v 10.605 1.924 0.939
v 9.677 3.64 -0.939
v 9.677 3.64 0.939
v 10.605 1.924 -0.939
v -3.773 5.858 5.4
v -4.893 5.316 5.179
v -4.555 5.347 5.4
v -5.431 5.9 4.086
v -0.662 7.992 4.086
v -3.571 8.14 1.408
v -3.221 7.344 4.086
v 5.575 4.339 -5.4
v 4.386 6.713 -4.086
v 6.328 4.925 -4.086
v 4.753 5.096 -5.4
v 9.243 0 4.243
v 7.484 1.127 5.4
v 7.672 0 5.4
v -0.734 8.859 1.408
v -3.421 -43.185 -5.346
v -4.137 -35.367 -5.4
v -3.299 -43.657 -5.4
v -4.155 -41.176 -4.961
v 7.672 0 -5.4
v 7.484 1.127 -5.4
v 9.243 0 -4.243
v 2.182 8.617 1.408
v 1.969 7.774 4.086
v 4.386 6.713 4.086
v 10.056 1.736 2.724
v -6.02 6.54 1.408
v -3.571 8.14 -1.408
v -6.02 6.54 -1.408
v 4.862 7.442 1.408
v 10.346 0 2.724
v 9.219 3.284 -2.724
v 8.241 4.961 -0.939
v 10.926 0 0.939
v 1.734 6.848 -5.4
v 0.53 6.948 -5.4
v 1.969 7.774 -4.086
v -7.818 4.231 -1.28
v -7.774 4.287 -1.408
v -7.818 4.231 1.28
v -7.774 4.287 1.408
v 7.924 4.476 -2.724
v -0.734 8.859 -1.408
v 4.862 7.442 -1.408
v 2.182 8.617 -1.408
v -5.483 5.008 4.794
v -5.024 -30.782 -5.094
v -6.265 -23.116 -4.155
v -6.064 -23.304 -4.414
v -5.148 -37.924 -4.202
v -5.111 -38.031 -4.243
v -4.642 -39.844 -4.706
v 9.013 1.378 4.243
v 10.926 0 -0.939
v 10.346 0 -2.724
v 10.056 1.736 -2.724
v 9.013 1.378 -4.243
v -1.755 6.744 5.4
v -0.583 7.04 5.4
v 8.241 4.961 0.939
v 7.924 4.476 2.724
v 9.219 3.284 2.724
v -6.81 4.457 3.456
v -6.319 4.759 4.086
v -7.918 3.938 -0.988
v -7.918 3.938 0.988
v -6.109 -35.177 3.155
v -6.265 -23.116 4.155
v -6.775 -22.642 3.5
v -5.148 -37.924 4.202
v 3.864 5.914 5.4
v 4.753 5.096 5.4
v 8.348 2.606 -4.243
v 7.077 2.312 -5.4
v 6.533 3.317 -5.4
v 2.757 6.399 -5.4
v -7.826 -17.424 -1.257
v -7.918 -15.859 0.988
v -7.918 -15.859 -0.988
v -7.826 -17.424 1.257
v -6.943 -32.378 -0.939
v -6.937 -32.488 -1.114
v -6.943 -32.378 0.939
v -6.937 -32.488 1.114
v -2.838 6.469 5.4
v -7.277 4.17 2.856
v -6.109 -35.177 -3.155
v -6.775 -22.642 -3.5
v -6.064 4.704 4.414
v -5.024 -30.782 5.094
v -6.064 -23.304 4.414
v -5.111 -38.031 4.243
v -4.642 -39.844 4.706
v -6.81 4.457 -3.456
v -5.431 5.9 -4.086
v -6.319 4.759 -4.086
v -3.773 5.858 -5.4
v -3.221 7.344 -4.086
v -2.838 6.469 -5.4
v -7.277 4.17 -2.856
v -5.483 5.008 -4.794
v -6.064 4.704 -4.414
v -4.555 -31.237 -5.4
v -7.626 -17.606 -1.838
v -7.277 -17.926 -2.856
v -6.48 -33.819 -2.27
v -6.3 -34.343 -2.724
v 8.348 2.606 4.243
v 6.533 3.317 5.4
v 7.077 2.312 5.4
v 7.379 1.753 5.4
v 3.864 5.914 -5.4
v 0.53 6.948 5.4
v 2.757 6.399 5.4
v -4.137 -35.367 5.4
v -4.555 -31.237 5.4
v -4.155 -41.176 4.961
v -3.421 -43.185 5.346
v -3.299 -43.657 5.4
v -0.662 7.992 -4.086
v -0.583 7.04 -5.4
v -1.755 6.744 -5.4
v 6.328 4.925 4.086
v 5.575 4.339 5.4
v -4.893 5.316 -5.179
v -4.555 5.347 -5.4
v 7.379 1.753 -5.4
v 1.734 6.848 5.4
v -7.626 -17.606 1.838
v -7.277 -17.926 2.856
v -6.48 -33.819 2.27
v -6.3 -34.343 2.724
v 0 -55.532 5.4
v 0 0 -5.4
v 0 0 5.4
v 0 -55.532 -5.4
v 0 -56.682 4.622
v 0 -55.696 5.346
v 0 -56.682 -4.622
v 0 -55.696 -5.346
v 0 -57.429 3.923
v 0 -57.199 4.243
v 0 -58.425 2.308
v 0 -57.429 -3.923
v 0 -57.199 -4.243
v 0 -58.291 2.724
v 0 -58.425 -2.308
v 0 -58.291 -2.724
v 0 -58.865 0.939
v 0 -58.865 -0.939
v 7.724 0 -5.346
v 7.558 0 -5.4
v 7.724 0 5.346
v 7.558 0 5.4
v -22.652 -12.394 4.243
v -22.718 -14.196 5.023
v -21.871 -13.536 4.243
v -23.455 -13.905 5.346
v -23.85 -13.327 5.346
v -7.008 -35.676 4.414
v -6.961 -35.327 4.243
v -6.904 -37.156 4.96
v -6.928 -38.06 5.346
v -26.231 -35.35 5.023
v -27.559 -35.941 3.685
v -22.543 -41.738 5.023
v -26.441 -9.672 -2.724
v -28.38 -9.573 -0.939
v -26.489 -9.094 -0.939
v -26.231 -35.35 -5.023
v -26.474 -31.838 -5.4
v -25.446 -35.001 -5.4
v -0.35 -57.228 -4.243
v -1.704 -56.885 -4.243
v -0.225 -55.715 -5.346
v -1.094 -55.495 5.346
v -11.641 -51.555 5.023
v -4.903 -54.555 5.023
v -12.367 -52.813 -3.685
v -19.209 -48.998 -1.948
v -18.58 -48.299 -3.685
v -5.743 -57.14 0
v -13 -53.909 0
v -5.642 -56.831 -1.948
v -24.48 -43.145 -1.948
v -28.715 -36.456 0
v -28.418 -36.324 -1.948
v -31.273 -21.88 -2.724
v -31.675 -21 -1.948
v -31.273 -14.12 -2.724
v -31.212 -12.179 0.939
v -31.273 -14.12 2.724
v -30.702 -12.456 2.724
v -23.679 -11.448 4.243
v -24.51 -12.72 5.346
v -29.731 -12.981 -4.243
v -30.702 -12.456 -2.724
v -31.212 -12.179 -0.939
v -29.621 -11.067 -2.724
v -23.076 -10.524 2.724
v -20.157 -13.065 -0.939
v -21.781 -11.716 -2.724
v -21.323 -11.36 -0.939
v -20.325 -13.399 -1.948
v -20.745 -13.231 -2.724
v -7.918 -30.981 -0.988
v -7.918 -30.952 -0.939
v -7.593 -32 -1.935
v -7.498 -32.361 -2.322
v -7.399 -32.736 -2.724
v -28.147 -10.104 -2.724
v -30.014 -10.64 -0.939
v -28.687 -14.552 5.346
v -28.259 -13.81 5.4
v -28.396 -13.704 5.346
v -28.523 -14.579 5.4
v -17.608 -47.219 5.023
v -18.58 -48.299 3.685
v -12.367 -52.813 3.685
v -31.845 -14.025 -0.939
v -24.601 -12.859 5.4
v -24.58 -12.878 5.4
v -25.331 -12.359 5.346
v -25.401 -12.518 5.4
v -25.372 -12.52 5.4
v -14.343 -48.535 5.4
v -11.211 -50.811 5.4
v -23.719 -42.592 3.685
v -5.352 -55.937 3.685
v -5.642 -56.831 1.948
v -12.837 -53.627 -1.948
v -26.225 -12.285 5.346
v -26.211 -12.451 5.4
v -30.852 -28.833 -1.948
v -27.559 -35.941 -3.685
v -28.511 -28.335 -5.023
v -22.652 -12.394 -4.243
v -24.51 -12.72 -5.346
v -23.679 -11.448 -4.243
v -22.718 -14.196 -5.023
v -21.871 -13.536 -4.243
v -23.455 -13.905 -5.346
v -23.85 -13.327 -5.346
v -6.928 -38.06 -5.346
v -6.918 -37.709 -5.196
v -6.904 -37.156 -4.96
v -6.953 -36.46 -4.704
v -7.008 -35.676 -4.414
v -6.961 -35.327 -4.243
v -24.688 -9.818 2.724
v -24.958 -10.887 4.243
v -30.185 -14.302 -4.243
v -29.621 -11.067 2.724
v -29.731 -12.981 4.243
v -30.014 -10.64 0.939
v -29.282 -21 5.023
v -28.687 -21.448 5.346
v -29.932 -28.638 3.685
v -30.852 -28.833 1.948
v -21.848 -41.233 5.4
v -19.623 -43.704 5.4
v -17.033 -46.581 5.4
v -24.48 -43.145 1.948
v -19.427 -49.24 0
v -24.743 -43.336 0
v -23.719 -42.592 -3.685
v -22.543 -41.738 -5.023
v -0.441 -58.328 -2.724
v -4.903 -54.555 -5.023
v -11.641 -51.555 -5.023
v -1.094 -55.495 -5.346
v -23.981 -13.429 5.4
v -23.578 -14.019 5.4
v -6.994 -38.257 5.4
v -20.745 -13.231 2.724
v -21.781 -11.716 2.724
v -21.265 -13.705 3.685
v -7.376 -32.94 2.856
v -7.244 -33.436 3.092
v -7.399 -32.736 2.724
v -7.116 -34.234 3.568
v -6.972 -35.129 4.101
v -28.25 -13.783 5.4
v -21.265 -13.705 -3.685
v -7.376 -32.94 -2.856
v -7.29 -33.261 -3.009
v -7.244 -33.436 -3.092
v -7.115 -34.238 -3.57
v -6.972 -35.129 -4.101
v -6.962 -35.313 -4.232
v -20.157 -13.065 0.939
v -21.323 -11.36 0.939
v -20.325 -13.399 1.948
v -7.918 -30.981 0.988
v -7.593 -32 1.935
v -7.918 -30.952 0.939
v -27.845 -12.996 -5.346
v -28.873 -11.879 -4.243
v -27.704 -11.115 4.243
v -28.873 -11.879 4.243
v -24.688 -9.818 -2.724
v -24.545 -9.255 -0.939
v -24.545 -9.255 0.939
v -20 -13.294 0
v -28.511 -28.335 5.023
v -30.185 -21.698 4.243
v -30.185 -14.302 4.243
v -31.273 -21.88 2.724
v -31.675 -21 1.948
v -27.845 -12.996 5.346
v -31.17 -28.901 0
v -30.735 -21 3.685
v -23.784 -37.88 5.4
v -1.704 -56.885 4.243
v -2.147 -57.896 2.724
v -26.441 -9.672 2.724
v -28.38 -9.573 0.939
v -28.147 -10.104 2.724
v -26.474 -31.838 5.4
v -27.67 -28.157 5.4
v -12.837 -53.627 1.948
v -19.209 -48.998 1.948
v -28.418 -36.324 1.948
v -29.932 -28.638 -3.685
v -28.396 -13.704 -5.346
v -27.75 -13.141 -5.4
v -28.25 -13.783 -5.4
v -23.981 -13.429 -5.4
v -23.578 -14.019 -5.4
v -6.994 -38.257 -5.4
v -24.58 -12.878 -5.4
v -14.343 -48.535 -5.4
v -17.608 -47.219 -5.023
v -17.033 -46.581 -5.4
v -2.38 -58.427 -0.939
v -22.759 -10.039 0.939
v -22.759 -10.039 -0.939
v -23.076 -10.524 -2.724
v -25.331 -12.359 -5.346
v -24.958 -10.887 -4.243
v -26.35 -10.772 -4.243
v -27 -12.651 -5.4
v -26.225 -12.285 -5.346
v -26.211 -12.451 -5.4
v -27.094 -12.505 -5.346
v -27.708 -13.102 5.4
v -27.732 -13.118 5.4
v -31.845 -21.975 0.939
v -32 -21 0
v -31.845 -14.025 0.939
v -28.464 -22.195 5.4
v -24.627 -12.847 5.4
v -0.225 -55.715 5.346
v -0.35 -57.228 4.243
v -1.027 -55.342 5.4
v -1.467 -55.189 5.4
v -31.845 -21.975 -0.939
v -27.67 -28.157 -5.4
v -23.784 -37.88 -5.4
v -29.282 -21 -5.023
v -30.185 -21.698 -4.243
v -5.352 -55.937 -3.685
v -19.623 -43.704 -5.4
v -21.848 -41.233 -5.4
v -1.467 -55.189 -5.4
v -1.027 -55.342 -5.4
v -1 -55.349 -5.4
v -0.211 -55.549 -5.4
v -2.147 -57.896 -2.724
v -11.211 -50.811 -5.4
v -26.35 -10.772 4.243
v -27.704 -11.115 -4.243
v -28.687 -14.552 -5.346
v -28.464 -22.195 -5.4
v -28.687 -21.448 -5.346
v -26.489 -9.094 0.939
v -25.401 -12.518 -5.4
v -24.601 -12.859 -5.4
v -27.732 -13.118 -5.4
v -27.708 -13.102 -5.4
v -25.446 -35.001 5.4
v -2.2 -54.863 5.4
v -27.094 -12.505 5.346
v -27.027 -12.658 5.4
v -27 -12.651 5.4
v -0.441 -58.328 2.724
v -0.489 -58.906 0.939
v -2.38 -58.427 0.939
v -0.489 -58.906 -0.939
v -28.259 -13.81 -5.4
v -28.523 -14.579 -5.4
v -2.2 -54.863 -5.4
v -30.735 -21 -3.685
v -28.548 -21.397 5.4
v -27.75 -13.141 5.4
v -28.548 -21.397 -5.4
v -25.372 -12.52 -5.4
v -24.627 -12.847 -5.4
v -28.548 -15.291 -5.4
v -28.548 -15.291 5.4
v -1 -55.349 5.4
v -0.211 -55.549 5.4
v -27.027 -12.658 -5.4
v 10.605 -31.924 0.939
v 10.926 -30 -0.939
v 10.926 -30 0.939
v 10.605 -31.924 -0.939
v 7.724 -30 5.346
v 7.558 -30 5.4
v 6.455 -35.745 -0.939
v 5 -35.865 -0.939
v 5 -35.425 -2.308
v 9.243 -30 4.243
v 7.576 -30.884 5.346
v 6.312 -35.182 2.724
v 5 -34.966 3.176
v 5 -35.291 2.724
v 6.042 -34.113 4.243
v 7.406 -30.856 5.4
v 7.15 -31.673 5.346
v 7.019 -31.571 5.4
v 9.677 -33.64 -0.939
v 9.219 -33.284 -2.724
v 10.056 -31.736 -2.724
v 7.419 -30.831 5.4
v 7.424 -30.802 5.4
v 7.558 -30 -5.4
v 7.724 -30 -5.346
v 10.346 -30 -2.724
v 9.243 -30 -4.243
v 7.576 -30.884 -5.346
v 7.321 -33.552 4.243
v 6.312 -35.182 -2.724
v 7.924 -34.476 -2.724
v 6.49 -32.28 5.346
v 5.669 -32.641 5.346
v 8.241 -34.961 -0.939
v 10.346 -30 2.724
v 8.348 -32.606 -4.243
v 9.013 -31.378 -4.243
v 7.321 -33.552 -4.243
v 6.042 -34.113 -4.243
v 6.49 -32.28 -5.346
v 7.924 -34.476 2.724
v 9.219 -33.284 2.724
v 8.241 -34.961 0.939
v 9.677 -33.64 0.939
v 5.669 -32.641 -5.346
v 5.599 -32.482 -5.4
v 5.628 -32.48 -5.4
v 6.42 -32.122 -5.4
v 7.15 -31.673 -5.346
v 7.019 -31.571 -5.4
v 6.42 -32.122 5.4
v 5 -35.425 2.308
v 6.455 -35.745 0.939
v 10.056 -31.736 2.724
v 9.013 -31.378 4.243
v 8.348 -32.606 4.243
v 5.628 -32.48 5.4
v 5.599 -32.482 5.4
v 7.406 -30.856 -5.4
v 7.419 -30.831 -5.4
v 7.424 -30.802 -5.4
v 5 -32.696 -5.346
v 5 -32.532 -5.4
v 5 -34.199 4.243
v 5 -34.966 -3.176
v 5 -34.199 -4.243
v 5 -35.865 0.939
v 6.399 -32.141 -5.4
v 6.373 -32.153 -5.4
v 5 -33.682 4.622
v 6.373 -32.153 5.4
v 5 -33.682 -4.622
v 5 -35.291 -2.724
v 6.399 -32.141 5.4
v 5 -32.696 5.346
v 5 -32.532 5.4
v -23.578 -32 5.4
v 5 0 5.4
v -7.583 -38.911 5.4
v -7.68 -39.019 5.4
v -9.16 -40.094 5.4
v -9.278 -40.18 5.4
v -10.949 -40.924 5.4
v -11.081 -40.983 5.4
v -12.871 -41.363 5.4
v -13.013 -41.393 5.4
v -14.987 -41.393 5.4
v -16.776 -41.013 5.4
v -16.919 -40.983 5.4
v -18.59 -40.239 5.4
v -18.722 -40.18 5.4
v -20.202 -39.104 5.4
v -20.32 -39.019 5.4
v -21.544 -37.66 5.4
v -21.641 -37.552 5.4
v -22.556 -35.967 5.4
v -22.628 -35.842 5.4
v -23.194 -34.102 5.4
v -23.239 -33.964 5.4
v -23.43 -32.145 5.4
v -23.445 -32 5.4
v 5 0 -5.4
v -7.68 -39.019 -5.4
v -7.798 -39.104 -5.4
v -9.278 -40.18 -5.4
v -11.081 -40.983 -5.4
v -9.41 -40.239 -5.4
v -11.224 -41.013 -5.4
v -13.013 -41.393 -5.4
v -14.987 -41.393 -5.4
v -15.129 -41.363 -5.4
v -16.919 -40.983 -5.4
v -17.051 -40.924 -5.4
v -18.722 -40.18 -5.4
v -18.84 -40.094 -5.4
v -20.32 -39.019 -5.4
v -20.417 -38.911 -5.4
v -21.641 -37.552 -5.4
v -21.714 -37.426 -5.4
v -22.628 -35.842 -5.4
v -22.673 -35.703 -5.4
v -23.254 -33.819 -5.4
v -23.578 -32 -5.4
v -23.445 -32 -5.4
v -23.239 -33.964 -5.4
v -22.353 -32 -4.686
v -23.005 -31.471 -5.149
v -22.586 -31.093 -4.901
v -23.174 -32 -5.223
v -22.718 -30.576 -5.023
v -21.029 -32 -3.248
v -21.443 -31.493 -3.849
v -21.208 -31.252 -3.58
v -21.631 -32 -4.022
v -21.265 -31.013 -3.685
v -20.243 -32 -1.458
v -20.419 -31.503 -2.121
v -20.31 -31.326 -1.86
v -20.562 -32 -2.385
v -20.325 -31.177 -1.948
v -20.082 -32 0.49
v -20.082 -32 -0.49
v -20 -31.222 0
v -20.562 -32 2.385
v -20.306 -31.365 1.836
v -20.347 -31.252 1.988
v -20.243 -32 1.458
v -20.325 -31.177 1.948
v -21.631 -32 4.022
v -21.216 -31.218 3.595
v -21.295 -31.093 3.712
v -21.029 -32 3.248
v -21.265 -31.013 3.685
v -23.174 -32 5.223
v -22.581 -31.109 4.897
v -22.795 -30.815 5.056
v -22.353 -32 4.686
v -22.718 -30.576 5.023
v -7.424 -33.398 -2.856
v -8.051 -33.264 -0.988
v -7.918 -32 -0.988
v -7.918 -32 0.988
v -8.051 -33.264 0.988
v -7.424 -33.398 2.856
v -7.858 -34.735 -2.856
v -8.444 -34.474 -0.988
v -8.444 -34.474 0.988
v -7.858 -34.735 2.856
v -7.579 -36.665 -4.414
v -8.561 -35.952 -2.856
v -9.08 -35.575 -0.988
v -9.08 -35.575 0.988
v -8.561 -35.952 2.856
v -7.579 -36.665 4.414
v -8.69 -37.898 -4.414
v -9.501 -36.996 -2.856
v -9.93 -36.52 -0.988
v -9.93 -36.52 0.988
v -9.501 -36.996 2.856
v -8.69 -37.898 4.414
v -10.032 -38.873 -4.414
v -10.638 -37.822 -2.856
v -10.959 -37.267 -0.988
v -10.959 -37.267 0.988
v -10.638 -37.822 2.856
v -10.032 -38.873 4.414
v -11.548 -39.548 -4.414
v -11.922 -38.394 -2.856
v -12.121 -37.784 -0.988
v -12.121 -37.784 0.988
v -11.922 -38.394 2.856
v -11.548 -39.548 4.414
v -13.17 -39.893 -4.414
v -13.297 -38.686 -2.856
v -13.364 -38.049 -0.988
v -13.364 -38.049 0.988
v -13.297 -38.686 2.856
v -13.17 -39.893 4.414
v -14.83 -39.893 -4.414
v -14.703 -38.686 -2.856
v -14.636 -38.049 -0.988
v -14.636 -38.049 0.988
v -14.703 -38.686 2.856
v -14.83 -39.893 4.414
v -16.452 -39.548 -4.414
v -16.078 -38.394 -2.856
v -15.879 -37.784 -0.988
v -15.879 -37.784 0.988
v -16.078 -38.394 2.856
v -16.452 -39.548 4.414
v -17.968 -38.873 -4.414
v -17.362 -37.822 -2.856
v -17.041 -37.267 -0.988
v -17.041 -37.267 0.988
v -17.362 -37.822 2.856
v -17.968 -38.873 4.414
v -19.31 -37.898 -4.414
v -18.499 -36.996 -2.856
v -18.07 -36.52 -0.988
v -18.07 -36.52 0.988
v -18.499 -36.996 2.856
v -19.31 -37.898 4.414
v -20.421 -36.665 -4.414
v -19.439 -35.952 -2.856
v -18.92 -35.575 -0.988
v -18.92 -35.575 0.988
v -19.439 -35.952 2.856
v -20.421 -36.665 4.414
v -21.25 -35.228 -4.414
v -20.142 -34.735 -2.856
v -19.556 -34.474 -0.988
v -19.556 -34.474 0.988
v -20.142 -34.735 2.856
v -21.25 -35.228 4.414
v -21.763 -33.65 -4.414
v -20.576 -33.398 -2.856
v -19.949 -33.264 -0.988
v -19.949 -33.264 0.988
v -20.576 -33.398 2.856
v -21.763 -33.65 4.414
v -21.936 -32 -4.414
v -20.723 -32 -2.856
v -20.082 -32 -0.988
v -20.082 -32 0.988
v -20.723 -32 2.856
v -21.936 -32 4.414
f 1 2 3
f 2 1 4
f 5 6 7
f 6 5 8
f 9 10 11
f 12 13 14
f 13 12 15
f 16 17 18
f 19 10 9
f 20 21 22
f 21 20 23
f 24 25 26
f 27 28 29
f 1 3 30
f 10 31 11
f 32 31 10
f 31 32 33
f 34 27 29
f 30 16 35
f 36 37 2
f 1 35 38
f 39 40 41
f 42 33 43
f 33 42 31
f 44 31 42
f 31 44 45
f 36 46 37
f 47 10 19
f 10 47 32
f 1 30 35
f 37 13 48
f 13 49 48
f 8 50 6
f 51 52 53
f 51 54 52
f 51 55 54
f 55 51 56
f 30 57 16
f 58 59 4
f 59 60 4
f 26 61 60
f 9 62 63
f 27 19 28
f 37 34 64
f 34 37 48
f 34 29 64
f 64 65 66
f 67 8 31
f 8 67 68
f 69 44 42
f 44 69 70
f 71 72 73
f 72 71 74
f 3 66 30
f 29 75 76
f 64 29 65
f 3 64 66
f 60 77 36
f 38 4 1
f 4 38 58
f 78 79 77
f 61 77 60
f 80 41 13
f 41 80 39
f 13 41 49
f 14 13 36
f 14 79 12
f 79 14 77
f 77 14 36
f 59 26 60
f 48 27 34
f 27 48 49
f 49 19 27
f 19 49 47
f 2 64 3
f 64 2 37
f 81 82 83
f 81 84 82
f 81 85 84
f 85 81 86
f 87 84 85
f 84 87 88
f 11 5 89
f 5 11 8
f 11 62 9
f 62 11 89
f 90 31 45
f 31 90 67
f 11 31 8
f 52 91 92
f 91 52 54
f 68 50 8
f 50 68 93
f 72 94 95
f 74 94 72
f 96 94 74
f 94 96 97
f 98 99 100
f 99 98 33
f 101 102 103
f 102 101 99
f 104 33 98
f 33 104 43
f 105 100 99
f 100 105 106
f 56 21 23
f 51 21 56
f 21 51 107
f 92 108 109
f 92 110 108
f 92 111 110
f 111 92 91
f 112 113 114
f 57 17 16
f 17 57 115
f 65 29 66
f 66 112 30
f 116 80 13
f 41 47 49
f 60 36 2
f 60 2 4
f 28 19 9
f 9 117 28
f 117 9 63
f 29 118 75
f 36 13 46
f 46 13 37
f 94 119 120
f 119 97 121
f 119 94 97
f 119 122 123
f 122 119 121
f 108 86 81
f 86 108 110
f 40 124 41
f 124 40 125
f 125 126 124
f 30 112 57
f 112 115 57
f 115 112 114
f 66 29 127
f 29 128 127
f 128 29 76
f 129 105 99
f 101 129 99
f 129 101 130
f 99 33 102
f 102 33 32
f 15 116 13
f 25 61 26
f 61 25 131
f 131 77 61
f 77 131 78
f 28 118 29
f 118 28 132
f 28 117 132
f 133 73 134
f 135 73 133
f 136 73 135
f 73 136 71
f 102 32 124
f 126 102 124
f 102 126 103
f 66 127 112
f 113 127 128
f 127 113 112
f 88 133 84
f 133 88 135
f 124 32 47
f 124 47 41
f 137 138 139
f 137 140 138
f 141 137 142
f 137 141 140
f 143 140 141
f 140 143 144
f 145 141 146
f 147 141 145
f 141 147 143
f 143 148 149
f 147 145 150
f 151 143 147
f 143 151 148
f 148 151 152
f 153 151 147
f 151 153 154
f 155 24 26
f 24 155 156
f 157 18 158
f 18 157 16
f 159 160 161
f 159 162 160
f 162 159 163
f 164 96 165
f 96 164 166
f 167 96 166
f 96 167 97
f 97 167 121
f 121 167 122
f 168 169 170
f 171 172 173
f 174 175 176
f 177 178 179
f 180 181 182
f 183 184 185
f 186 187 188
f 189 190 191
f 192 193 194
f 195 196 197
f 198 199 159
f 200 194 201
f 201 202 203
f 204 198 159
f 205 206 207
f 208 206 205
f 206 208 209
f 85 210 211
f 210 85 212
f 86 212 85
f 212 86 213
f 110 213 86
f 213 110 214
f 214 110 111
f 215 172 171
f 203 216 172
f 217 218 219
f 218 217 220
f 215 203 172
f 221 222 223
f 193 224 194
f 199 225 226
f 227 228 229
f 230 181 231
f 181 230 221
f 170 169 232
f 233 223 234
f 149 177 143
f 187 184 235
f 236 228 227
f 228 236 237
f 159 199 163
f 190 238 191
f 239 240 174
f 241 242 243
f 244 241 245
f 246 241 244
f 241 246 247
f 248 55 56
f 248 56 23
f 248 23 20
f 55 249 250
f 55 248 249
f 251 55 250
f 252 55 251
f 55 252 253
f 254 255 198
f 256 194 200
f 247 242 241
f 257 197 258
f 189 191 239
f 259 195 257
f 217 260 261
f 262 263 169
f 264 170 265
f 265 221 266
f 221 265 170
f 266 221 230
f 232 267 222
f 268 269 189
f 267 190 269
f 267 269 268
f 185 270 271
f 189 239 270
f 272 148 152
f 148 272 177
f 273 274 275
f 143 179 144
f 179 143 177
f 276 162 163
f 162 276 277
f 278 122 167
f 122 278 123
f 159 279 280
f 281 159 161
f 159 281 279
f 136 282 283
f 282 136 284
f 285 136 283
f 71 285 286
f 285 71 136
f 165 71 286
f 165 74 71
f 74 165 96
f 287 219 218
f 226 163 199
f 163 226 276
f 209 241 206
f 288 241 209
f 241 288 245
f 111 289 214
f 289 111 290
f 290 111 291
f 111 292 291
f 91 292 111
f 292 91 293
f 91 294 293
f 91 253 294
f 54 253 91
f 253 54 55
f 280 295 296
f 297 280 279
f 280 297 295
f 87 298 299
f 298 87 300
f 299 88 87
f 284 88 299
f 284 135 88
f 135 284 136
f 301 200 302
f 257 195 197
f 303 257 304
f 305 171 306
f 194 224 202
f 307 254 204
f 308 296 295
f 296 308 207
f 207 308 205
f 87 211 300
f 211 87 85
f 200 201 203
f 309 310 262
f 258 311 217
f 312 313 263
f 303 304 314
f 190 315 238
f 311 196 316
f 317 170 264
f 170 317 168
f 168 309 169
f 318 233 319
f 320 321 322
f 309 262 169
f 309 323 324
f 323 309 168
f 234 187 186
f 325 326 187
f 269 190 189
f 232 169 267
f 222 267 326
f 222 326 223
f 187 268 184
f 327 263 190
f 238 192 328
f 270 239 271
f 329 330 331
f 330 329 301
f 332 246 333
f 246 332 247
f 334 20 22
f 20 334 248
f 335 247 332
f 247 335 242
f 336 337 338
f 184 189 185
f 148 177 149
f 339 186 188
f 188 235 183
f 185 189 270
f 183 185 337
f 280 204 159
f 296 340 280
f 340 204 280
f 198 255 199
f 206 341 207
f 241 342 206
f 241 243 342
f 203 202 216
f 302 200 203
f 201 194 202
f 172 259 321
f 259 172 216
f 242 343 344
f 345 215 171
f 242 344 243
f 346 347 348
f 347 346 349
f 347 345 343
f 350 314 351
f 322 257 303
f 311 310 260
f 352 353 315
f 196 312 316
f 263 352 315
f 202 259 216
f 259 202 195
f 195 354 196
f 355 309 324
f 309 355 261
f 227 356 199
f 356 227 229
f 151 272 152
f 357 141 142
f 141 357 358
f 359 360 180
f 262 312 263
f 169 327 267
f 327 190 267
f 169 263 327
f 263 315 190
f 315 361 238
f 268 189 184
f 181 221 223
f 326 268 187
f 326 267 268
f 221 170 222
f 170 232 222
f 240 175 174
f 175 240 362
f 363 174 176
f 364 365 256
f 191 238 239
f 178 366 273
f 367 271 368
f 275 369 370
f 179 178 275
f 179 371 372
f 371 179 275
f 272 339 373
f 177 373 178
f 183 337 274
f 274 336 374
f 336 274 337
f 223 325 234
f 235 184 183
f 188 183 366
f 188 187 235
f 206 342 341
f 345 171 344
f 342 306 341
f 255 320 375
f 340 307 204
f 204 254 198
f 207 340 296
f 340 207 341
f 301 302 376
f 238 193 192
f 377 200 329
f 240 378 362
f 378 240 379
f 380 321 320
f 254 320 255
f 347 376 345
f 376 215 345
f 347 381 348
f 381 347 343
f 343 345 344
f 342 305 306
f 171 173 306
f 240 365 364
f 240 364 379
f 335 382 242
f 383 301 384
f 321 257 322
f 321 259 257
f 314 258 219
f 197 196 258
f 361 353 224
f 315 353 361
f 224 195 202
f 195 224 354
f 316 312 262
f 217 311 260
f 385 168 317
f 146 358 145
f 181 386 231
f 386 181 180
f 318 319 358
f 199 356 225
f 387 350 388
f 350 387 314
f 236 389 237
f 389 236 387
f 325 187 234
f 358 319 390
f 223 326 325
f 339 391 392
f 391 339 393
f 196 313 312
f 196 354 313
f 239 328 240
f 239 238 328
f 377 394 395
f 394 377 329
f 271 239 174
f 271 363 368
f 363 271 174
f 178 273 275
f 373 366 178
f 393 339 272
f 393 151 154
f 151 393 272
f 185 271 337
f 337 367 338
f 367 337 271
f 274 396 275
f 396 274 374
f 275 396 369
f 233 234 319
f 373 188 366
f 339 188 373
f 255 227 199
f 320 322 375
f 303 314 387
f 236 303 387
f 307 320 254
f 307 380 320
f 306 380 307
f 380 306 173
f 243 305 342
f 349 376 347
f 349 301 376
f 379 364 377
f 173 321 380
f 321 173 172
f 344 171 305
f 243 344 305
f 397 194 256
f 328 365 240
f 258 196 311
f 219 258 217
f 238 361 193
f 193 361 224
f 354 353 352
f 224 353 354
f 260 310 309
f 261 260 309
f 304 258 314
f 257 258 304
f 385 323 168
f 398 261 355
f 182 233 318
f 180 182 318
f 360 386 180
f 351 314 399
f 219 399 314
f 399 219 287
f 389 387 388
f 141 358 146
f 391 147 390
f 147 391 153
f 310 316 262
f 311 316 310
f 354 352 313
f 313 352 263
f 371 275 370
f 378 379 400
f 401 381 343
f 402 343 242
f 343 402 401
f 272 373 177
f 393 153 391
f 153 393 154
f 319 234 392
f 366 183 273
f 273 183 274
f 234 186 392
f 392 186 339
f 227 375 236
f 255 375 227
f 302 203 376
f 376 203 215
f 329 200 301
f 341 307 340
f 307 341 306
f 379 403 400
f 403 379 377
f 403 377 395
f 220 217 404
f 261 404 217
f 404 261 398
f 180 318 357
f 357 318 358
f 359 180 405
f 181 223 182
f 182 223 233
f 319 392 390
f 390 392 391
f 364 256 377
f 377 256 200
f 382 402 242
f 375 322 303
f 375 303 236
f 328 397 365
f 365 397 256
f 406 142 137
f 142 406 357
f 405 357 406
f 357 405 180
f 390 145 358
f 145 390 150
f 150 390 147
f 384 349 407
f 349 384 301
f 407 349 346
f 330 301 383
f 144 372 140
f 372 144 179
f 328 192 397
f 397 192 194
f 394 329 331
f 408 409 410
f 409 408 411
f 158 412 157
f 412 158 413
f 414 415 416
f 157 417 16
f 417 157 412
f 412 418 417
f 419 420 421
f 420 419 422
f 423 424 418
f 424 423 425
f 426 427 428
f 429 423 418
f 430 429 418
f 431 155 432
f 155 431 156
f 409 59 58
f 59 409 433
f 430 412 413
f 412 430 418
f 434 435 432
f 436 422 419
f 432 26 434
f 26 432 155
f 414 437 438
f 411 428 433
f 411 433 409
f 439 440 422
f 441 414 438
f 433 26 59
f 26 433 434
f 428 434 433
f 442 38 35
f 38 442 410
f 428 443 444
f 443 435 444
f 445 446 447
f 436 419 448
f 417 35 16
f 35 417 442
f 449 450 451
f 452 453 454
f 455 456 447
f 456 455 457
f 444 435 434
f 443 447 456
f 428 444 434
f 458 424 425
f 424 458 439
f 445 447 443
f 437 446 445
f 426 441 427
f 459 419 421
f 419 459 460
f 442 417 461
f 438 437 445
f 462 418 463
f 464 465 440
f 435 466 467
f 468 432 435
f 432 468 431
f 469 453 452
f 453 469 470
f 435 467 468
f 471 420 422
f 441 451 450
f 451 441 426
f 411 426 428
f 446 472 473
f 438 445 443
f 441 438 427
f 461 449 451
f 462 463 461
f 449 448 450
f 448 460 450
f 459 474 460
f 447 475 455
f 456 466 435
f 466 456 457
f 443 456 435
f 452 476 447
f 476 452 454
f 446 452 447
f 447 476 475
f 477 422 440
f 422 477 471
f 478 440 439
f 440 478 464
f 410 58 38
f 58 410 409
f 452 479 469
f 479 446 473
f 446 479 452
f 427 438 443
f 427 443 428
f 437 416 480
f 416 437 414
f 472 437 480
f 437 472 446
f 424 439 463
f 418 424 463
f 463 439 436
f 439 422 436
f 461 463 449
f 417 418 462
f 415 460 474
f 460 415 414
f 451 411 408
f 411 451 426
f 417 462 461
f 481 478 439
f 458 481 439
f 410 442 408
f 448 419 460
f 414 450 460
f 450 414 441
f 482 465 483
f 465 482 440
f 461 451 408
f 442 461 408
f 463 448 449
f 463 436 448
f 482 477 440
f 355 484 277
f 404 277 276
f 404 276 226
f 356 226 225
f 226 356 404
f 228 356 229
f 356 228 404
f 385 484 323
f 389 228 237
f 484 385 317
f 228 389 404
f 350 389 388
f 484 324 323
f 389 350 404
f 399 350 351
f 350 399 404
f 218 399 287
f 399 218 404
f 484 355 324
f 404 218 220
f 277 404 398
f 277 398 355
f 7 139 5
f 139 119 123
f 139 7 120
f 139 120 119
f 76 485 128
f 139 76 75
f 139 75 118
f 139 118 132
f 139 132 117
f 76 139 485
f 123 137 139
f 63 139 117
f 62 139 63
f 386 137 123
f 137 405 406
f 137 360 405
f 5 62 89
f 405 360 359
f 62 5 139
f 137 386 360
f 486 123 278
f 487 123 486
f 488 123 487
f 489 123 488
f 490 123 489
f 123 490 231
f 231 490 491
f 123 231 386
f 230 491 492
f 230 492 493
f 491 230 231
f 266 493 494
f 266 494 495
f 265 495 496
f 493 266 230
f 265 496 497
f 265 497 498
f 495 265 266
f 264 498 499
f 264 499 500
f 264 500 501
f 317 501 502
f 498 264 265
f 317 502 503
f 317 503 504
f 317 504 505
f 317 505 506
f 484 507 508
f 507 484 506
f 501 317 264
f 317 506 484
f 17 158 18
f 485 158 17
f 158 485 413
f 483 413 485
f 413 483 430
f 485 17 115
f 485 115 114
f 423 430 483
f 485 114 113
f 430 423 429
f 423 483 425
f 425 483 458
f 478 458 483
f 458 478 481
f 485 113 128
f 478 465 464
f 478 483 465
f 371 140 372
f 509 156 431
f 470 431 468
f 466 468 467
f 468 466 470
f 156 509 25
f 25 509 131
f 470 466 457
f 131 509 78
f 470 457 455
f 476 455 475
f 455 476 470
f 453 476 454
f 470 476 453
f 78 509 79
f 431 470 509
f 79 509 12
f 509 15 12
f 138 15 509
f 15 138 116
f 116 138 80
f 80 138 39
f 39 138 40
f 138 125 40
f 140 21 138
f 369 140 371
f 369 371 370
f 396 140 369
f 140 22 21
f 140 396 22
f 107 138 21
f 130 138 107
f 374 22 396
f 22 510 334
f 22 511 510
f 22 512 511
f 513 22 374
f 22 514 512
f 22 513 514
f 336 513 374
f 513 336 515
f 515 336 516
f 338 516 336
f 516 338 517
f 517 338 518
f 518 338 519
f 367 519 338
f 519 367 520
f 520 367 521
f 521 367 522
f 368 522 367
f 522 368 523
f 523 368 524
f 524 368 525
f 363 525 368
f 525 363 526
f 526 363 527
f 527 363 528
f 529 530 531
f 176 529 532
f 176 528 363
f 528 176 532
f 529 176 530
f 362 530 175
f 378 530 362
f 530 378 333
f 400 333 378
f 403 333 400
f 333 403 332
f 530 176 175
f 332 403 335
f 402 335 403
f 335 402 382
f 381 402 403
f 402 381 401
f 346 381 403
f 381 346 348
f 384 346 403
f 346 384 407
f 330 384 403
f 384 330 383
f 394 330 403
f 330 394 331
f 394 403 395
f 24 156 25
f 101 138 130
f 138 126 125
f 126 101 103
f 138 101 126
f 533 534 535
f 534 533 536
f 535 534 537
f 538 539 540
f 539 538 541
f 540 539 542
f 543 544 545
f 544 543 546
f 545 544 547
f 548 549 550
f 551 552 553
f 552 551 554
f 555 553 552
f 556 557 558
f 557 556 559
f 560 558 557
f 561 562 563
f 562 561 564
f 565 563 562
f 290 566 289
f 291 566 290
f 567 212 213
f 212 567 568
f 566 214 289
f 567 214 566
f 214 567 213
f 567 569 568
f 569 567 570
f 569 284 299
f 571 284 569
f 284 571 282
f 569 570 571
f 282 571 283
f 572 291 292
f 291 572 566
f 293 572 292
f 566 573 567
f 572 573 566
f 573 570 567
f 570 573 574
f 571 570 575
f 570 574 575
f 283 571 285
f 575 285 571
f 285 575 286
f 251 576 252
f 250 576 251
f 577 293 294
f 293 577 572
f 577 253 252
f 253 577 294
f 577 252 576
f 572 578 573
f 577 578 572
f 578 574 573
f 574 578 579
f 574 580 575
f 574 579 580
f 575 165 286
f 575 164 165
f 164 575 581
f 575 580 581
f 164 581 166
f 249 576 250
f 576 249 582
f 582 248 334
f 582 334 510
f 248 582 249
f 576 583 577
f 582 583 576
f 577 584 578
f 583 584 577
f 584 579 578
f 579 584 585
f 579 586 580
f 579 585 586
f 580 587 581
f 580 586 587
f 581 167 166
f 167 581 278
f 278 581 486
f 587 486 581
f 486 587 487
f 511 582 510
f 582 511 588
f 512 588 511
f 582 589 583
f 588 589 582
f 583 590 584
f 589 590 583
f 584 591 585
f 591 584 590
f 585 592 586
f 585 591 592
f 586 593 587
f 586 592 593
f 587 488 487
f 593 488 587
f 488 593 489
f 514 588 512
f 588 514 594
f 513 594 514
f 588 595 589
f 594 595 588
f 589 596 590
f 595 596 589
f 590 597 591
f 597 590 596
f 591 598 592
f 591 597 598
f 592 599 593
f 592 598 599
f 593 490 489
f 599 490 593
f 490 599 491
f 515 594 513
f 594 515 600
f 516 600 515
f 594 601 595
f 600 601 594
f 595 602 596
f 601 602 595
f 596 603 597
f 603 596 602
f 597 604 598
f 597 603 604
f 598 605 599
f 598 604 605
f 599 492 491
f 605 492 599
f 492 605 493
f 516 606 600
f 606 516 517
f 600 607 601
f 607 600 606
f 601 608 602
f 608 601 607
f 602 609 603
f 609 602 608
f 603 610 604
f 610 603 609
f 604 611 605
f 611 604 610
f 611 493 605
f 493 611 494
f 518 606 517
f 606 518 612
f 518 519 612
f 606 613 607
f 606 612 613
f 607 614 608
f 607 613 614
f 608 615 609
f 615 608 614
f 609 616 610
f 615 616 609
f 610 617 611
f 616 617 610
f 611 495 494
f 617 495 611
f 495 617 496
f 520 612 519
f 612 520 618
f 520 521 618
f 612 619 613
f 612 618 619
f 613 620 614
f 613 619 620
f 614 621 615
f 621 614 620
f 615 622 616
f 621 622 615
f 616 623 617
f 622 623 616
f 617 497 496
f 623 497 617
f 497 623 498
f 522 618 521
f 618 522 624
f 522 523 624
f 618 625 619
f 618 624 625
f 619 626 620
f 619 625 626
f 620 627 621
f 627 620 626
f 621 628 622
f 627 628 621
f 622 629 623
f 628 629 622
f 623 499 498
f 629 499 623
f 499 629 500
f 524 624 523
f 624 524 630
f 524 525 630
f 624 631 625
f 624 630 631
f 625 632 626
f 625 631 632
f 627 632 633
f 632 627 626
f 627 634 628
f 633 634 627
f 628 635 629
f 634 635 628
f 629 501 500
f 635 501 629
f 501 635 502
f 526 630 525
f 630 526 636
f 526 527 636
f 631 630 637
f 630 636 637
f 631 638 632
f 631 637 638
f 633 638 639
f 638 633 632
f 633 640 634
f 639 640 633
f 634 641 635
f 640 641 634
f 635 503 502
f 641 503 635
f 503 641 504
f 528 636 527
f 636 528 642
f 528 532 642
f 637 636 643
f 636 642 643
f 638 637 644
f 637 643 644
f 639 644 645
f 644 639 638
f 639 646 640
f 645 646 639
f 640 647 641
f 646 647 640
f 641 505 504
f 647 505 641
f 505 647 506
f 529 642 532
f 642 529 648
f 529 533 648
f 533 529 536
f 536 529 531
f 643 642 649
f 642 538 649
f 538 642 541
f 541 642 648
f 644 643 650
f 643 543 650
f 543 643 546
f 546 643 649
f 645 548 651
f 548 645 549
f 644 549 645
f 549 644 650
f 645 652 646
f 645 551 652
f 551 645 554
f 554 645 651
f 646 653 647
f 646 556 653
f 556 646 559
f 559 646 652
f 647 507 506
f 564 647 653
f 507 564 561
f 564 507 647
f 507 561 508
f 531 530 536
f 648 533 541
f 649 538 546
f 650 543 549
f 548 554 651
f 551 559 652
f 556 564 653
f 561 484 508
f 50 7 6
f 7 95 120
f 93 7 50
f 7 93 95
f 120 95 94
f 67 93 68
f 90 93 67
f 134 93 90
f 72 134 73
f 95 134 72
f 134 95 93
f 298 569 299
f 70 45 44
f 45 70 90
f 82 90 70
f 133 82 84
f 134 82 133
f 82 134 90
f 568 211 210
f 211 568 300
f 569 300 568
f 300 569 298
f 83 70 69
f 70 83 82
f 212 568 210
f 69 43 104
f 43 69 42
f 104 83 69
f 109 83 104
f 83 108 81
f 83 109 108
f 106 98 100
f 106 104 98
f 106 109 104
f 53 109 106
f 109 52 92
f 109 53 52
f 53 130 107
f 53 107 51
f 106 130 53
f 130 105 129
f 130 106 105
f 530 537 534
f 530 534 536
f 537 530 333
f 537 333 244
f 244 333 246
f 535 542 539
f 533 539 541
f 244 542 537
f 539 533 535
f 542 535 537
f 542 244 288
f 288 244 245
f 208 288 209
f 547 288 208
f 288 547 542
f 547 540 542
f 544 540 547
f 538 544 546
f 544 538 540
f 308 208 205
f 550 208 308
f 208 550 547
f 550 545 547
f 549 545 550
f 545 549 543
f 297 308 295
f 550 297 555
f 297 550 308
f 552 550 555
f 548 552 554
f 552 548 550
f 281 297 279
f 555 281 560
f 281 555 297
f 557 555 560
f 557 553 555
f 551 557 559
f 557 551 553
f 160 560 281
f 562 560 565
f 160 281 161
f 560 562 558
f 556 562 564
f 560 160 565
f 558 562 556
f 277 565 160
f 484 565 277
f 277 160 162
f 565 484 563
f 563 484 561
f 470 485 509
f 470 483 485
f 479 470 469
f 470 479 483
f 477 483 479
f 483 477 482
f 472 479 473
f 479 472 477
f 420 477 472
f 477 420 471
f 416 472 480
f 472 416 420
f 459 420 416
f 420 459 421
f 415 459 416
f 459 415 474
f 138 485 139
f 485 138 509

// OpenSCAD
//
//  Copyright (C) 11-04-2014 Jasper den Ouden.
//
//  This is free software: you can redistribute it and/or modify
//  it under the terms of the GNU General Public License as published
//  by the Free Software Foundation, either version 3 of the License, or
//  (at your option) any later version.
//

pt = 5;
t  = 6;
dh = 50; //Dry  side height
wh = 30; //Wet side height.

dx = 20+t;
dy = 20;

q = 3*t;

module plate_sub()
{
    translate([0,-8*dh,-4*t]) cube([pt,8*dh,8*t]);
}

module sgh_ws() //Wet side.
{
    hull()
    {   sphere(t);
        translate([0,-wh]) sphere(t);
        translate([pt,0])   sphere(t);
        translate([pt,-wh]) sphere(t);
    }
}
module sgh_ds() //Dry side.
{   difference()
    {   hull()
        {   scale(1.5) sphere(t);
            translate([0,-dh])  sphere(t);
            translate([pt,0])   sphere(t);
        }
        plate_sub(pt=8*dh);
    }
}
f=1;

module sgh_hook() //Add the hook bit.
{
    difference()
    {   translate([t,f*(dx+t/2)-dh]) hull()
        {
            translate([-dx-t,t]) sphere(t);
            translate([-dx-t,0]) sphere(t);
            translate([-t,-f*(dx+t)]) sphere(t);
//            translate([-t,t/2-f*(dx+t)]) sphere(t);
            scale([1,f,1]) rotate(180) intersection()
            {   rotate_extrude() translate([dx+t,0]) circle(t);
                translate([t,0,-dx-t]) cube(8*[dx,dx,dx]);
            }
        }
        plate_sub(pt=8*dh);
    }
}

module cut()
{   rotate_extrude() difference()
    {   translate(-t*[0,2]) square(t*[2,4]); 
        translate([2*t,0]) circle(t);
    }
    rotate([-90,0,0]) linear_extrude() difference()
    {   square(4*[t,t],center=true);
        for(x=t*[2,-2]) translate([x,0]) circle(t);
    }
}

module shower_glass_hook()
{
    difference()
    {   intersection()
        {   union()
            {   sgh_ds();
                sgh_ws();
                sgh_hook();
            }
            cube([dh*8,dh*8,1.8*t],center=true);
        }
        plate_sub();
        translate([-dx+2*t,-dh+3*t]) cut();
    }
}

shower_glass_hook();
